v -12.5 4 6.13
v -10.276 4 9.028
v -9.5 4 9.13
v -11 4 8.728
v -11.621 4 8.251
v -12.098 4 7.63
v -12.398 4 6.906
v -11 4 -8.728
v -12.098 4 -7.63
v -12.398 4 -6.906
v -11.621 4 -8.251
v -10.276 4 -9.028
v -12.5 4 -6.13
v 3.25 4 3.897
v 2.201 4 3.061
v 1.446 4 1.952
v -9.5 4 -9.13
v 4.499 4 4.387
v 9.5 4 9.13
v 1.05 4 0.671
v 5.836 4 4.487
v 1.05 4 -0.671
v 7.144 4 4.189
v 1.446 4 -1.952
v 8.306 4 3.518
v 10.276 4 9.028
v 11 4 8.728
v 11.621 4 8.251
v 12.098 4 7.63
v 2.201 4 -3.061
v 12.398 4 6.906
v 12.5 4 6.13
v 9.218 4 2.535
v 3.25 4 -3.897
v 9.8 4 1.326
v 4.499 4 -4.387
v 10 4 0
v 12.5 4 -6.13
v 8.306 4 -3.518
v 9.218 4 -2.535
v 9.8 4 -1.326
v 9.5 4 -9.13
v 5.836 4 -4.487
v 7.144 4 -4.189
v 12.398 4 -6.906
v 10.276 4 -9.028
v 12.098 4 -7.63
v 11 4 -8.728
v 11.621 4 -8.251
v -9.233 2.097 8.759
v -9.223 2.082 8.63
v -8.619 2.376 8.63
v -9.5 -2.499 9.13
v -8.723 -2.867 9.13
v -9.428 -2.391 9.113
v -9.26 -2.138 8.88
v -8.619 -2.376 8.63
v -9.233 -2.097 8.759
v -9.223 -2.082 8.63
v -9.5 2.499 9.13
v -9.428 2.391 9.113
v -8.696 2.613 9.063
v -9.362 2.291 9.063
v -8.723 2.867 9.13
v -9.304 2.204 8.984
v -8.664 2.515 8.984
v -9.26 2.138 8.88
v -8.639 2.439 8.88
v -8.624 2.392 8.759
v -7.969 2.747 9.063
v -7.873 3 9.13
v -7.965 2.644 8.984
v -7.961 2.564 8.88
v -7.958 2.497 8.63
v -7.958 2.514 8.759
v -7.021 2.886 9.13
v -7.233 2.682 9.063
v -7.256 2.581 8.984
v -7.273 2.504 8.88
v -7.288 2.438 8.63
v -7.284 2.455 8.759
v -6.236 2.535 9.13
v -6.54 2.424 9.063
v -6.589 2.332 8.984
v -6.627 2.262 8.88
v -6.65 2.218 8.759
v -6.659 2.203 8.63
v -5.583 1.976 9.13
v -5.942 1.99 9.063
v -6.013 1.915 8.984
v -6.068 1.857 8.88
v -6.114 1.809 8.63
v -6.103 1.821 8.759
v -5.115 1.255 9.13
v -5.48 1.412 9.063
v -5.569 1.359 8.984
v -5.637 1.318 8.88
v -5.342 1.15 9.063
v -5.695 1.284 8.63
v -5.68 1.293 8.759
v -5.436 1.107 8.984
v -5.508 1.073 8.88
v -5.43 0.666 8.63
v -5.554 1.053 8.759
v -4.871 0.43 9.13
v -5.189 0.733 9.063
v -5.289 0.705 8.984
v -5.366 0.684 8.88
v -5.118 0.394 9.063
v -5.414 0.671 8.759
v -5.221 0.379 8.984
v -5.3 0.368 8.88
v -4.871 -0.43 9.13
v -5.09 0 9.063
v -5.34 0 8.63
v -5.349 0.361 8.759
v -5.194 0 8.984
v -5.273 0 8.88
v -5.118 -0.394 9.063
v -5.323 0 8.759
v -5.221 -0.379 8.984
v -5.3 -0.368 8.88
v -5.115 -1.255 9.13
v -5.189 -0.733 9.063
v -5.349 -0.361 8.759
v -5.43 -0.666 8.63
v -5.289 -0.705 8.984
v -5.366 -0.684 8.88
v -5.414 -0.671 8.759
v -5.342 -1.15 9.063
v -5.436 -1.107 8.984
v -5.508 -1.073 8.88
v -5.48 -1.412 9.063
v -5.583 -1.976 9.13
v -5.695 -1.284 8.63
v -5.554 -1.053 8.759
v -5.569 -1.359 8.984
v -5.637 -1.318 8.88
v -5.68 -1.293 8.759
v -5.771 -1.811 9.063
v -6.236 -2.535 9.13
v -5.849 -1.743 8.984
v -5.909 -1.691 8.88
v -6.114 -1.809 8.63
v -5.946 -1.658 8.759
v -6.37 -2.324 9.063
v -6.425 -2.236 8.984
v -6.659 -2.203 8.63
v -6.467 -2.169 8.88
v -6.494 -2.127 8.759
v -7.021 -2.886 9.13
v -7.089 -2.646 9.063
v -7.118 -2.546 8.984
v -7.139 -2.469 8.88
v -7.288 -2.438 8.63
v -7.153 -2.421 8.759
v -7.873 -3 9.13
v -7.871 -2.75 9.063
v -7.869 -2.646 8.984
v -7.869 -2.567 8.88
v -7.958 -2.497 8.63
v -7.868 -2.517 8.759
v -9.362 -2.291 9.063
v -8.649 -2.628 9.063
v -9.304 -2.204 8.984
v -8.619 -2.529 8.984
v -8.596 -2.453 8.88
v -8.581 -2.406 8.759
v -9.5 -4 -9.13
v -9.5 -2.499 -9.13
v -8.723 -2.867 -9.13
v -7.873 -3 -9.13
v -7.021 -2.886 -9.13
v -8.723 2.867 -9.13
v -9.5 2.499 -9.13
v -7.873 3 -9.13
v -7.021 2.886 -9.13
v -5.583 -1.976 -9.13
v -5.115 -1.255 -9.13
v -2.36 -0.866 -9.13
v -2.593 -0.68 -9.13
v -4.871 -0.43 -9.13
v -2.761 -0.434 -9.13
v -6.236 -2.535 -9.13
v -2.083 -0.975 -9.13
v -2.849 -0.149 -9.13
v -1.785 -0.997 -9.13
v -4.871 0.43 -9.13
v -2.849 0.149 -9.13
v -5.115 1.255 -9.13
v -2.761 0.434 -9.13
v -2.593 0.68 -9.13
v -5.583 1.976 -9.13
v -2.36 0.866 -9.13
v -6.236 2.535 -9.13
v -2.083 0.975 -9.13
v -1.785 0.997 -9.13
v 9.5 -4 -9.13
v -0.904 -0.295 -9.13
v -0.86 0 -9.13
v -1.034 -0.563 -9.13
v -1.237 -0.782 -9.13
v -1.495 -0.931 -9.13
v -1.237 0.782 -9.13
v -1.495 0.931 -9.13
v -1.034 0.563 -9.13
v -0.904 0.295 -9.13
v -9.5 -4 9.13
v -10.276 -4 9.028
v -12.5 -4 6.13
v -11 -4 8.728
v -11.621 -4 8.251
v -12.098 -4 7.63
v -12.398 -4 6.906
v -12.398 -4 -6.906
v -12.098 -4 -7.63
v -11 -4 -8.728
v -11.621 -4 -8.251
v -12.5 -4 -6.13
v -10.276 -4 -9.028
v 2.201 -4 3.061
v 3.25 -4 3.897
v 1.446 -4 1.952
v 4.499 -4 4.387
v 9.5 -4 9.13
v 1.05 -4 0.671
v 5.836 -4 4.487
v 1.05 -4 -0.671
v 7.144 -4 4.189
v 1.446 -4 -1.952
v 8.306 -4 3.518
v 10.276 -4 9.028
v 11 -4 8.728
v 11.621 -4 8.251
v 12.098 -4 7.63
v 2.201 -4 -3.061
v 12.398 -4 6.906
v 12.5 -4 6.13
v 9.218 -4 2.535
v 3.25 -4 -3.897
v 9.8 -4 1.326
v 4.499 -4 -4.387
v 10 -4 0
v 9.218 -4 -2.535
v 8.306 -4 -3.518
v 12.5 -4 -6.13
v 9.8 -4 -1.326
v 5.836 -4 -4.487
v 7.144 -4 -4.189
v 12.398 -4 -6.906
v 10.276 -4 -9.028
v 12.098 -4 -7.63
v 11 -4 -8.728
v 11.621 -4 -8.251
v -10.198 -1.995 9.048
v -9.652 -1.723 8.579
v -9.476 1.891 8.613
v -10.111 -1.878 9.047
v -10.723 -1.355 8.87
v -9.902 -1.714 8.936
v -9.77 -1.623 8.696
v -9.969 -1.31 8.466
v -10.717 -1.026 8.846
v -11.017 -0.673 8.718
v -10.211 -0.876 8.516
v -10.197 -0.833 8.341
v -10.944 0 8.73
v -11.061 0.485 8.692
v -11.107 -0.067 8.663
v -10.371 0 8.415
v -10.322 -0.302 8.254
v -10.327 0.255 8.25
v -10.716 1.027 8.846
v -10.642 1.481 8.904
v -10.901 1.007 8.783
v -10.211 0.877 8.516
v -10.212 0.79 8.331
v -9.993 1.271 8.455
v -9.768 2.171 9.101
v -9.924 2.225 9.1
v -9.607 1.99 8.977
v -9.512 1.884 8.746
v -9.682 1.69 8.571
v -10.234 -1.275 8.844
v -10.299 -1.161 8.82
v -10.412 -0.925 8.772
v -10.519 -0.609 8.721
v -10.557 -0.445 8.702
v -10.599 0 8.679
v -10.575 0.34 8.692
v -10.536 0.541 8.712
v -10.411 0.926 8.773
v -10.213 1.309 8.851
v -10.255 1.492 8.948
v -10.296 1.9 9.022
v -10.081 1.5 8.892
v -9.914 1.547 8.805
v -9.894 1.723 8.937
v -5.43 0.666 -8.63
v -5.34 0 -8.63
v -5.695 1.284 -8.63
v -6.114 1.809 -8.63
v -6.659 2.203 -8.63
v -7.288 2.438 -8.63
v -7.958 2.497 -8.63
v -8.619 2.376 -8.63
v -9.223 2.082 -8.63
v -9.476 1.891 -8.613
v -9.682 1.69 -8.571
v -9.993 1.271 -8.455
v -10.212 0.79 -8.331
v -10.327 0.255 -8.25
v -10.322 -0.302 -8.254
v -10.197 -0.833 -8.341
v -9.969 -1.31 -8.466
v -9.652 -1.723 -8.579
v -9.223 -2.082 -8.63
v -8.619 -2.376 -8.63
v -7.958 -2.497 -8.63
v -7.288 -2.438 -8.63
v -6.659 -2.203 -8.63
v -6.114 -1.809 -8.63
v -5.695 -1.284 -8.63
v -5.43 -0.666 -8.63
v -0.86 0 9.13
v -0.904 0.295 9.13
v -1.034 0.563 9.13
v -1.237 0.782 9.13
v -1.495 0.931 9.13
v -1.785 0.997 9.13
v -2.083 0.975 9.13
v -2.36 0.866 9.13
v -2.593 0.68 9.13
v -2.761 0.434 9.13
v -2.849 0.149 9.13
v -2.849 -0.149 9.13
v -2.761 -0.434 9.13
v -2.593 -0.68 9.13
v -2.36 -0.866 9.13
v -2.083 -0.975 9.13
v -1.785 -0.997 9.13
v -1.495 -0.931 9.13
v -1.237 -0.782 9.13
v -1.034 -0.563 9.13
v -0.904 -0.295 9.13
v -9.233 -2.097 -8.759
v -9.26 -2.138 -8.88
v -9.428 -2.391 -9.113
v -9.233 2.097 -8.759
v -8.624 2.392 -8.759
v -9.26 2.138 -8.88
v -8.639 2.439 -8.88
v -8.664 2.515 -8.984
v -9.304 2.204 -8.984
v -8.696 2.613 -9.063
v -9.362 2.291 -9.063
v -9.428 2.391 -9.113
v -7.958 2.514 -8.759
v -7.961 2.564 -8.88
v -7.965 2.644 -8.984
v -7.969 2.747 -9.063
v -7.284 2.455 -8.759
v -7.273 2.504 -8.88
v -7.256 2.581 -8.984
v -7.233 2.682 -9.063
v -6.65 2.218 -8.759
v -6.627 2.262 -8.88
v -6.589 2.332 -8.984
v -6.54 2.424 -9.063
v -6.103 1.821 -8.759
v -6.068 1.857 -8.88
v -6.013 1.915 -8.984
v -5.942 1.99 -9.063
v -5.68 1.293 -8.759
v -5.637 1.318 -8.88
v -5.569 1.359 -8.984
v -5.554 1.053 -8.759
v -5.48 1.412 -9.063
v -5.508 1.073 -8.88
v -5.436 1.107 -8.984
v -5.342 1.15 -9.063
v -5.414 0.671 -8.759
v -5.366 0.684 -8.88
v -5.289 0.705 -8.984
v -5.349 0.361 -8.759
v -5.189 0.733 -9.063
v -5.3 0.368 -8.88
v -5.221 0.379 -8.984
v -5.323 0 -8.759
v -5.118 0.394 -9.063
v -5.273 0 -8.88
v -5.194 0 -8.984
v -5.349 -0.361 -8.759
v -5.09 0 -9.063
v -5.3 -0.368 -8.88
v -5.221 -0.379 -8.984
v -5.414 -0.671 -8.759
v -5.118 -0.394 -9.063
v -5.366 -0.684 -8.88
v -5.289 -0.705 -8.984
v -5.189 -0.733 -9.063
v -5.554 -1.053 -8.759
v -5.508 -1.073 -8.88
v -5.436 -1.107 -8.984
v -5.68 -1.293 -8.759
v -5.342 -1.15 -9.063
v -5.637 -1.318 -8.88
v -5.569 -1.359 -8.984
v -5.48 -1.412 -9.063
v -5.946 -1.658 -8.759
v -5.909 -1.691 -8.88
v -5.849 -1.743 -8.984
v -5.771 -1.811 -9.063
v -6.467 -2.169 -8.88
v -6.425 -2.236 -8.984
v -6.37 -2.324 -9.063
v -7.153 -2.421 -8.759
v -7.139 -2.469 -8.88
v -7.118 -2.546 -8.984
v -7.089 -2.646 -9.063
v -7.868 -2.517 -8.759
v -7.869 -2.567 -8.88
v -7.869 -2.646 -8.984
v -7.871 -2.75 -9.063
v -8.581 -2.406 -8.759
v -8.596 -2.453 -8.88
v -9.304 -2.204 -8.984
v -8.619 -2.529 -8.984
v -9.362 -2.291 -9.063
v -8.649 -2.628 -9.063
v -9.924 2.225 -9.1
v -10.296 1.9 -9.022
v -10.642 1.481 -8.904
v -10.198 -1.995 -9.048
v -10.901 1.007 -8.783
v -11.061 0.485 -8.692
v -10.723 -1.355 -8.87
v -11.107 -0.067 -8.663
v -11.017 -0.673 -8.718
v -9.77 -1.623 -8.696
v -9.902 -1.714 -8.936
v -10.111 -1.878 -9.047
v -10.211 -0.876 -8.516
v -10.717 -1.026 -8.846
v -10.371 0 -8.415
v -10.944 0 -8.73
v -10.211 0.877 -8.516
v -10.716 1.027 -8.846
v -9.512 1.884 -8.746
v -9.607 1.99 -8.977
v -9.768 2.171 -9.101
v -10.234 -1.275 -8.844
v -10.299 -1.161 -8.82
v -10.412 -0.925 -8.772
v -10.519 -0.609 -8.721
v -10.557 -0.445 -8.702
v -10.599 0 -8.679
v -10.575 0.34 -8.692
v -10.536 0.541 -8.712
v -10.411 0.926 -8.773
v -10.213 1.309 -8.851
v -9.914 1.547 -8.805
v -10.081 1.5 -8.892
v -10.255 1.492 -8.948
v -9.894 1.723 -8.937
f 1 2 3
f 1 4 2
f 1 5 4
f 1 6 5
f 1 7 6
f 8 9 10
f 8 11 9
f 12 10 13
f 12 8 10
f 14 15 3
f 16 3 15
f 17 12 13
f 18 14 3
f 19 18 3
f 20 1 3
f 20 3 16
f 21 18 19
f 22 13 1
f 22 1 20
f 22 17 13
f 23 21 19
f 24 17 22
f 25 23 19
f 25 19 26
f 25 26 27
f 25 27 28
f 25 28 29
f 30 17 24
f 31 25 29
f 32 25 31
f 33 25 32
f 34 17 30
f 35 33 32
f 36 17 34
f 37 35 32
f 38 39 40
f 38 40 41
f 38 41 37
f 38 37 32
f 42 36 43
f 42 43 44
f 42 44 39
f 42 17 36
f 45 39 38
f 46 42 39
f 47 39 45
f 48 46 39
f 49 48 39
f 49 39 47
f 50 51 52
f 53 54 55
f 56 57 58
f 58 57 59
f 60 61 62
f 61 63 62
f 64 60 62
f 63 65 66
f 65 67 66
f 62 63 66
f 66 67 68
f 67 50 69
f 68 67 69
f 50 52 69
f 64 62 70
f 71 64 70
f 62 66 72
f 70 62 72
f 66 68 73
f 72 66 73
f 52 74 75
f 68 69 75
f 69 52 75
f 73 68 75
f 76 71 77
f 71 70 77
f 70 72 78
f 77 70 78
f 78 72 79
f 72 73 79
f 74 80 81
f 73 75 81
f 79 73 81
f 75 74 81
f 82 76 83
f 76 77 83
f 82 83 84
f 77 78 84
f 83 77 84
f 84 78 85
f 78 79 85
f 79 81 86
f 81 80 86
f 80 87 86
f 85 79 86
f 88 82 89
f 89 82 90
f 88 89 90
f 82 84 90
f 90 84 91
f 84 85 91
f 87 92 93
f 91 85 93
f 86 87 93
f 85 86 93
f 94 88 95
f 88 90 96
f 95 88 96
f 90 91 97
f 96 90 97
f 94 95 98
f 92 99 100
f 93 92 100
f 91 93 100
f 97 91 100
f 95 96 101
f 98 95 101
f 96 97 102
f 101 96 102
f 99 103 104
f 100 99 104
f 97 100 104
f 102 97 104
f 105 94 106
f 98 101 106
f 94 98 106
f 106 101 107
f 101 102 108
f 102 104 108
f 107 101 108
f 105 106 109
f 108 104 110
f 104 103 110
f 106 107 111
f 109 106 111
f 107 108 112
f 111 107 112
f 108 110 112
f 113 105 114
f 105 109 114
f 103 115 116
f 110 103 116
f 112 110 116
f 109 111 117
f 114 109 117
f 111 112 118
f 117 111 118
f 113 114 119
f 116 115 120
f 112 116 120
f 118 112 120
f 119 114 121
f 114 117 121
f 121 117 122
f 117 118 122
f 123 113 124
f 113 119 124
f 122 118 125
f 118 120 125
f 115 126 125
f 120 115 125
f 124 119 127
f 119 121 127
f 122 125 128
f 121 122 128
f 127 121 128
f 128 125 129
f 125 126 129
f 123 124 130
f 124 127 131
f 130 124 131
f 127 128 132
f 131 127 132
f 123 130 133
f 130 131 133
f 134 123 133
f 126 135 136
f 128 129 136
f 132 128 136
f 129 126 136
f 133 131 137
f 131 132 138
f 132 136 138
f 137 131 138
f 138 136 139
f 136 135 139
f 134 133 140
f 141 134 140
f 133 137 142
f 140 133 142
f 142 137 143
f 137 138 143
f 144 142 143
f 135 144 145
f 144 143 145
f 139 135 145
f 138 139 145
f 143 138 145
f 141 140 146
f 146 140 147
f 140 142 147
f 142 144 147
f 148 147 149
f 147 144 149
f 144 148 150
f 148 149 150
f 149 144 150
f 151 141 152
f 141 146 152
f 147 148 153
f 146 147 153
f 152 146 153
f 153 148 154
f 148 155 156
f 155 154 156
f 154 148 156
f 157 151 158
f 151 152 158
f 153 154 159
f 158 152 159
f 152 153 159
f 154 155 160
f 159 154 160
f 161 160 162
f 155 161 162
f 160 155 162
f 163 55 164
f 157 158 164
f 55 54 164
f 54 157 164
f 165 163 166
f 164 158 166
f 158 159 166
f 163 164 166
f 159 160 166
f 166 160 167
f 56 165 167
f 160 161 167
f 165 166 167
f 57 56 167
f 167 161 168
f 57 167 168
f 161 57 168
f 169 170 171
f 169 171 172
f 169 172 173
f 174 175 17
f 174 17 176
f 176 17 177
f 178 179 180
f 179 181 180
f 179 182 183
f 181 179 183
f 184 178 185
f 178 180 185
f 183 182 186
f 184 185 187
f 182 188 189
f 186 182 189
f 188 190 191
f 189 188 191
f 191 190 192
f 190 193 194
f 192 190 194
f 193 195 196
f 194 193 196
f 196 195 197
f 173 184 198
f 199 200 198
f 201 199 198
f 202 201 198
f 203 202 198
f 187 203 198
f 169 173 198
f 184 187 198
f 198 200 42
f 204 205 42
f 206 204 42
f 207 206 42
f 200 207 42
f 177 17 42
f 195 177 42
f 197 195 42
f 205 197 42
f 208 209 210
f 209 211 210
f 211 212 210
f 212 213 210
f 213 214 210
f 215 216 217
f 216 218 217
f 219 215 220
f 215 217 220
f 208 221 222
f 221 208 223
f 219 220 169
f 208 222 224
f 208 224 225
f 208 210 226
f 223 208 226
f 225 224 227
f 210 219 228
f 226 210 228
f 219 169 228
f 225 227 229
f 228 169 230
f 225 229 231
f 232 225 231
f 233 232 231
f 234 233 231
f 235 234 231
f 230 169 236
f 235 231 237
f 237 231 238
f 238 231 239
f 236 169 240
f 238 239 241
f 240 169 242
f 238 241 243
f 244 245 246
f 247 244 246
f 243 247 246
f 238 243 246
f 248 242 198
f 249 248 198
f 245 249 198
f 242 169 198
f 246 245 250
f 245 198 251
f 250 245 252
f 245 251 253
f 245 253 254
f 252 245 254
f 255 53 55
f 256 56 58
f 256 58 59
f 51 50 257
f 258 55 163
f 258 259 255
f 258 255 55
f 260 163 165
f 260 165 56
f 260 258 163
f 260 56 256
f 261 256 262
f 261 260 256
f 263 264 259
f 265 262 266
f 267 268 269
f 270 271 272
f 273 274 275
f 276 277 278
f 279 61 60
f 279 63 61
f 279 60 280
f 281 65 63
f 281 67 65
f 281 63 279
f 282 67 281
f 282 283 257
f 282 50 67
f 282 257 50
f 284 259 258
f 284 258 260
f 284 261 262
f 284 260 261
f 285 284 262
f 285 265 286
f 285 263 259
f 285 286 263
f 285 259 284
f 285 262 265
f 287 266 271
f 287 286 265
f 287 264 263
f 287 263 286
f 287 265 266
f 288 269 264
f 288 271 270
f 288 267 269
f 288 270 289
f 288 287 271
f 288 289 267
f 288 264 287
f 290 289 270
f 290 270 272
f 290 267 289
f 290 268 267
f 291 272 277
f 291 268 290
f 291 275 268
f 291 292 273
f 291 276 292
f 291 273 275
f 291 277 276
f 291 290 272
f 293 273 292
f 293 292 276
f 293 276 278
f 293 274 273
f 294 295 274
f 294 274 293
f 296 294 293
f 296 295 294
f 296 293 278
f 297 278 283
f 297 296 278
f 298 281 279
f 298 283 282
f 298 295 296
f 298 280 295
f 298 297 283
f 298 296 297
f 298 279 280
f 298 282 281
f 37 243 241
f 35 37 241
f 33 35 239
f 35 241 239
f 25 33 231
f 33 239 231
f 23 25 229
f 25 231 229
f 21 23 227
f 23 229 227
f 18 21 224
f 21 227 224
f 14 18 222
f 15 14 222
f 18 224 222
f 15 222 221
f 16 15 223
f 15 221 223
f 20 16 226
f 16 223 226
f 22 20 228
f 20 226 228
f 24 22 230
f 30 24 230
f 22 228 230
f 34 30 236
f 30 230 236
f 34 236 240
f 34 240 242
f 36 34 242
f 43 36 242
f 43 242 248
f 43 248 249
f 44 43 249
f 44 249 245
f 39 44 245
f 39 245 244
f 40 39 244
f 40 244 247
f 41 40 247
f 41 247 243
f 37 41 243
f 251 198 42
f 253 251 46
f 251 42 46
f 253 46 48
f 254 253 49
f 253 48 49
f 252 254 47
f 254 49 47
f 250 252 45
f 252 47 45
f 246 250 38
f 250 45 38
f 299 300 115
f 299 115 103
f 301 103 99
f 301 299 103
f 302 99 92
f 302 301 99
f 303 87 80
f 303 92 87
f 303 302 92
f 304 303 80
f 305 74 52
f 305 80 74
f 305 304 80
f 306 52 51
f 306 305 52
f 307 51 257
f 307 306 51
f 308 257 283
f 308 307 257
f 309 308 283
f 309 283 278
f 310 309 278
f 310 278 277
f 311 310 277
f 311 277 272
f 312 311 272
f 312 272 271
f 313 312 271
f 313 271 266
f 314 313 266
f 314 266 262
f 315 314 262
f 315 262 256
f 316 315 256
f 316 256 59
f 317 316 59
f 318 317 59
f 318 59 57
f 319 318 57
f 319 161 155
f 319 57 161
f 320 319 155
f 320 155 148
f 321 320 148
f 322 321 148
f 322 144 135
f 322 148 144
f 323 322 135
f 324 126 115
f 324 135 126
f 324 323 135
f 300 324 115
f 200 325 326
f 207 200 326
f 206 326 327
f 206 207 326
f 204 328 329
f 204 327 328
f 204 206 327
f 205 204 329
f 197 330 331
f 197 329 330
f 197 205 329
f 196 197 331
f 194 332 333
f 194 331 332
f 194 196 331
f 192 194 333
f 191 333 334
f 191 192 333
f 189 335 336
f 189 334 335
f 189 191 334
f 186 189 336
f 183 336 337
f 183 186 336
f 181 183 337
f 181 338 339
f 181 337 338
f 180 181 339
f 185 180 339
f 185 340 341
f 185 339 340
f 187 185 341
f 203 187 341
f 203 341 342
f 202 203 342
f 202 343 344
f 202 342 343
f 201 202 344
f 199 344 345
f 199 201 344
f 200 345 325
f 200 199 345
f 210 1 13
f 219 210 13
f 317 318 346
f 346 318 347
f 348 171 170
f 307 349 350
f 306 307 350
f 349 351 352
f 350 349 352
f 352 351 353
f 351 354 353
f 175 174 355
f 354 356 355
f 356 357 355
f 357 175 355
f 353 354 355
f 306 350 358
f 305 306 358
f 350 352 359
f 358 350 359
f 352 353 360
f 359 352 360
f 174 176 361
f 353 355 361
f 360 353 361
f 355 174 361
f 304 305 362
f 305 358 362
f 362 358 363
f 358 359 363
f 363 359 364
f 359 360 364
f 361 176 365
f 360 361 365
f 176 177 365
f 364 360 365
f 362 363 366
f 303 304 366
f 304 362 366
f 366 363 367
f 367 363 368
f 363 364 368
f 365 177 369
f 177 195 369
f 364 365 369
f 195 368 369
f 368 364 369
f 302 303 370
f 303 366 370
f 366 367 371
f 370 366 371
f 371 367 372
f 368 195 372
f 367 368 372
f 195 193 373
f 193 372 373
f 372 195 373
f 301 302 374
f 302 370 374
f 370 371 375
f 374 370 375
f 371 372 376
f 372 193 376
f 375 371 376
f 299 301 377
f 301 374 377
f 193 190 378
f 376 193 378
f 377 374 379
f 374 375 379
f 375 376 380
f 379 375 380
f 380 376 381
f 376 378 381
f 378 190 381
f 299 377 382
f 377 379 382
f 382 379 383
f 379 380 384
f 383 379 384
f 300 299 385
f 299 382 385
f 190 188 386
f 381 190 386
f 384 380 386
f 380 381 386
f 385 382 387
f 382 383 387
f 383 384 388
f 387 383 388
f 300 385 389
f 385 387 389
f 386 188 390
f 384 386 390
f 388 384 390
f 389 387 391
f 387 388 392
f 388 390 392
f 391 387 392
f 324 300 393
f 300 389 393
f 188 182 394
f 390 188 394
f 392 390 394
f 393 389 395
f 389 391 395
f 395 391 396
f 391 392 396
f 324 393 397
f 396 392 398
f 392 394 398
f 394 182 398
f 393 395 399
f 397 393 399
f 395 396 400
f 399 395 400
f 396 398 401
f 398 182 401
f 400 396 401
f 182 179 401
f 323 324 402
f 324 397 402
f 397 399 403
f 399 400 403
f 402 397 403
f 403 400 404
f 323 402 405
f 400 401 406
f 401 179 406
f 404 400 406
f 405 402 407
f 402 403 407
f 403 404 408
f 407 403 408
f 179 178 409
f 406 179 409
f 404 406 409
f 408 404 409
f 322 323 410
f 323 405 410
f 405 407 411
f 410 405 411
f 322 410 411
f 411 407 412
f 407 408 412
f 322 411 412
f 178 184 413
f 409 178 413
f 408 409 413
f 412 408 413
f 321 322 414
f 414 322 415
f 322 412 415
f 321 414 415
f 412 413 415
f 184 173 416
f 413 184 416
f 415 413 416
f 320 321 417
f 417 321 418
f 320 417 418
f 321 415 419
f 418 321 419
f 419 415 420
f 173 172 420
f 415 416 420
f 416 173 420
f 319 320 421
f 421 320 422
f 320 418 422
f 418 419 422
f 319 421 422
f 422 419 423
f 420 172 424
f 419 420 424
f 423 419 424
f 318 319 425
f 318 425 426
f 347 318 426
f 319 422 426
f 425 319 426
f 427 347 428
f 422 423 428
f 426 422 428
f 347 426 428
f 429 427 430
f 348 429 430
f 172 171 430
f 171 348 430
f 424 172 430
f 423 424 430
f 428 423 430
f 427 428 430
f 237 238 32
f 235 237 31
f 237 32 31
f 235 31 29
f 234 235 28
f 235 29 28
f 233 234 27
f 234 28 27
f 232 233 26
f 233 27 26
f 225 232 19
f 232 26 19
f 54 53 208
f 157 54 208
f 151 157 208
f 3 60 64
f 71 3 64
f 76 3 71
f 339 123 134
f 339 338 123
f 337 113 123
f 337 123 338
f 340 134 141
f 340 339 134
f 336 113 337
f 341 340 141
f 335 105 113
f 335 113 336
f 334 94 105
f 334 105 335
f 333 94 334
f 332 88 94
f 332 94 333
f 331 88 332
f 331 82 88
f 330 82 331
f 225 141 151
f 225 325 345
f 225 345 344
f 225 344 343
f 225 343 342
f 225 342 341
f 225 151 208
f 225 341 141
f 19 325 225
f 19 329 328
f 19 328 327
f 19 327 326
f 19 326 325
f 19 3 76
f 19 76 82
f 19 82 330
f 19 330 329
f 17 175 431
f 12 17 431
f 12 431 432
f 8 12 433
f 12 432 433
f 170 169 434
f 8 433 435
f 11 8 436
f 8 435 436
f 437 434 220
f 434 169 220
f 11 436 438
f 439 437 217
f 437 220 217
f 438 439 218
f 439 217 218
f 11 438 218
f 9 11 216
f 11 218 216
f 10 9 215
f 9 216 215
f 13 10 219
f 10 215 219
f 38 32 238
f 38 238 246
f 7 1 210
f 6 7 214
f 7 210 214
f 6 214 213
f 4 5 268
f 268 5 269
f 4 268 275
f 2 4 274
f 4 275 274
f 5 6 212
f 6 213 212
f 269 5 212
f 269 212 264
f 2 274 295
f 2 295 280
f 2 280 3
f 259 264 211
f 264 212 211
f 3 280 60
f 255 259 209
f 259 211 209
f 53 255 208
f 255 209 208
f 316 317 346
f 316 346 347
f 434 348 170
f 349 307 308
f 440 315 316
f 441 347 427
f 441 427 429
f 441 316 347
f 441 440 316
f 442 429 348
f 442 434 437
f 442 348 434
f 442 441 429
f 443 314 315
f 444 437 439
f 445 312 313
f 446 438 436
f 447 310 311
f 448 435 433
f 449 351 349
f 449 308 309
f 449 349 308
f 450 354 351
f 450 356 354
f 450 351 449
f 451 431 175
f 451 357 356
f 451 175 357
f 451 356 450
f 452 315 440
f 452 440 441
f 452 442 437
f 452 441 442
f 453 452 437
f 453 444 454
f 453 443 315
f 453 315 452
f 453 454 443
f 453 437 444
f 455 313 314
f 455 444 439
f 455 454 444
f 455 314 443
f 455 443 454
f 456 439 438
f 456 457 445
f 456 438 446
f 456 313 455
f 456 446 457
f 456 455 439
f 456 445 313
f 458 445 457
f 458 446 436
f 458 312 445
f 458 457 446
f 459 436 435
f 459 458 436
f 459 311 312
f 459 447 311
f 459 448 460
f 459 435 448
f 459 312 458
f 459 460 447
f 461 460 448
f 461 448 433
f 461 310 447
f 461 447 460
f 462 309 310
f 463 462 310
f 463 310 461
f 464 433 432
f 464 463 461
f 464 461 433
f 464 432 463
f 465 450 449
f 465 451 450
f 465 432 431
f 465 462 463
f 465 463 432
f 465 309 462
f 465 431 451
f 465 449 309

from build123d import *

# Parameters (mm, degrees)
SKETCH1_W                  = 25
SKETCH1_H                  = 18.26
BOSS_EXTRUDE1_DEPTH        = 4
M10X1_0_TAPPED_HOLE1_D     = 9
M10X1_0_TAPPED_HOLE1_DEPTH = 25
M10X1_0_TAPPED_HOLE1_TIP   = 2.703872786
CUT_EXTRUDE1_DEPTH         = 16.987710906
CUT_EXTRUDE1_DEPTH_BACK    = 16.987710906
SKETCH4_R                  = 2.5
SKETCH4_R_2                = 1
FILLET1_R                  = 3
FILLET2_R                  = 0.5


with BuildPart() as part:
    # Sketch1 → Boss-Extrude1 (new, symmetric)
    with BuildSketch(Plane(origin=(0, 0, 0), x_dir=(1, 0, 0), z_dir=(0, 1, 0))):
        Rectangle(SKETCH1_W, SKETCH1_H)
    extrude(amount=BOSS_EXTRUDE1_DEPTH, both=True)

    # M10x1.0 Tapped Hole1
    with Locations(Plane(origin=(0, 4, 0), x_dir=(-1, 0, 0), z_dir=(0, 1, 0))):
        with Locations((-5.5, 0)):
            Hole(M10X1_0_TAPPED_HOLE1_D / 2, depth=M10X1_0_TAPPED_HOLE1_DEPTH)
            with Locations((0, 0, -(M10X1_0_TAPPED_HOLE1_DEPTH + M10X1_0_TAPPED_HOLE1_TIP / 2))):  # 118° drill point
                Cone(0, M10X1_0_TAPPED_HOLE1_D / 2, M10X1_0_TAPPED_HOLE1_TIP, mode=Mode.SUBTRACT)

    # Sketch4 → Cut-Extrude1 (cut, two sides: drawn at the far end of the back side and taken through both)
    with BuildSketch(Plane.XY.offset(-CUT_EXTRUDE1_DEPTH_BACK)):
        with Locations((-7.84, 0)):
            Circle(SKETCH4_R)
        with Locations((-1.86, 0)):
            Circle(SKETCH4_R_2)
    extrude(amount=CUT_EXTRUDE1_DEPTH + CUT_EXTRUDE1_DEPTH_BACK, mode=Mode.SUBTRACT)

    # Fillet1
    # the kernel refuses this fillet: 3 mm, written as the material it takes off along each edge
    with BuildSketch(Plane(origin=(-12.5, -11.5, -9.13), x_dir=(1, 0, 0), z_dir=(0, 1, 0)), Plane(origin=(12.5, 11.5, -9.13), x_dir=(-1, 0, 0), z_dir=(0, -1, 0))) as fillet1_piece_1:
        with BuildLine():
            CenterArc((FILLET1_R, -FILLET1_R), FILLET1_R, 90, 90)
            Line((0, -FILLET1_R), (0, 0))
            Line((0, 0), (FILLET1_R, 0))
        make_face()
    extrude(amount=23, mode=Mode.SUBTRACT)
    with BuildSketch(Plane(origin=(12.5, 11.5, 9.13), x_dir=(-1, 0, 0), z_dir=(0, -1, 0)), Plane(origin=(-12.5, -11.5, 9.13), x_dir=(1, 0, 0), z_dir=(0, 1, 0))) as fillet1_piece_2:
        with BuildLine():
            CenterArc((FILLET1_R, FILLET1_R), FILLET1_R, 180, 90)
            Line((0, FILLET1_R), (0, 0))
            Line((0, 0), (FILLET1_R, 0))
        make_face()
    extrude(amount=23, mode=Mode.SUBTRACT)

    # Fillet2
    fillet2_edges = [part.edges().sort_by_distance(p)[0] for p in [
        (-6.815304923, 2.28035085, -9.13),
        (-6.815304923, -2.28035085, 9.13),
        (-10.34, 0, 9.01),
        (-10.34, 0, -9.01),
    ]]
    fillet(fillet2_edges, radius=FILLET2_R)


solid = part.part
